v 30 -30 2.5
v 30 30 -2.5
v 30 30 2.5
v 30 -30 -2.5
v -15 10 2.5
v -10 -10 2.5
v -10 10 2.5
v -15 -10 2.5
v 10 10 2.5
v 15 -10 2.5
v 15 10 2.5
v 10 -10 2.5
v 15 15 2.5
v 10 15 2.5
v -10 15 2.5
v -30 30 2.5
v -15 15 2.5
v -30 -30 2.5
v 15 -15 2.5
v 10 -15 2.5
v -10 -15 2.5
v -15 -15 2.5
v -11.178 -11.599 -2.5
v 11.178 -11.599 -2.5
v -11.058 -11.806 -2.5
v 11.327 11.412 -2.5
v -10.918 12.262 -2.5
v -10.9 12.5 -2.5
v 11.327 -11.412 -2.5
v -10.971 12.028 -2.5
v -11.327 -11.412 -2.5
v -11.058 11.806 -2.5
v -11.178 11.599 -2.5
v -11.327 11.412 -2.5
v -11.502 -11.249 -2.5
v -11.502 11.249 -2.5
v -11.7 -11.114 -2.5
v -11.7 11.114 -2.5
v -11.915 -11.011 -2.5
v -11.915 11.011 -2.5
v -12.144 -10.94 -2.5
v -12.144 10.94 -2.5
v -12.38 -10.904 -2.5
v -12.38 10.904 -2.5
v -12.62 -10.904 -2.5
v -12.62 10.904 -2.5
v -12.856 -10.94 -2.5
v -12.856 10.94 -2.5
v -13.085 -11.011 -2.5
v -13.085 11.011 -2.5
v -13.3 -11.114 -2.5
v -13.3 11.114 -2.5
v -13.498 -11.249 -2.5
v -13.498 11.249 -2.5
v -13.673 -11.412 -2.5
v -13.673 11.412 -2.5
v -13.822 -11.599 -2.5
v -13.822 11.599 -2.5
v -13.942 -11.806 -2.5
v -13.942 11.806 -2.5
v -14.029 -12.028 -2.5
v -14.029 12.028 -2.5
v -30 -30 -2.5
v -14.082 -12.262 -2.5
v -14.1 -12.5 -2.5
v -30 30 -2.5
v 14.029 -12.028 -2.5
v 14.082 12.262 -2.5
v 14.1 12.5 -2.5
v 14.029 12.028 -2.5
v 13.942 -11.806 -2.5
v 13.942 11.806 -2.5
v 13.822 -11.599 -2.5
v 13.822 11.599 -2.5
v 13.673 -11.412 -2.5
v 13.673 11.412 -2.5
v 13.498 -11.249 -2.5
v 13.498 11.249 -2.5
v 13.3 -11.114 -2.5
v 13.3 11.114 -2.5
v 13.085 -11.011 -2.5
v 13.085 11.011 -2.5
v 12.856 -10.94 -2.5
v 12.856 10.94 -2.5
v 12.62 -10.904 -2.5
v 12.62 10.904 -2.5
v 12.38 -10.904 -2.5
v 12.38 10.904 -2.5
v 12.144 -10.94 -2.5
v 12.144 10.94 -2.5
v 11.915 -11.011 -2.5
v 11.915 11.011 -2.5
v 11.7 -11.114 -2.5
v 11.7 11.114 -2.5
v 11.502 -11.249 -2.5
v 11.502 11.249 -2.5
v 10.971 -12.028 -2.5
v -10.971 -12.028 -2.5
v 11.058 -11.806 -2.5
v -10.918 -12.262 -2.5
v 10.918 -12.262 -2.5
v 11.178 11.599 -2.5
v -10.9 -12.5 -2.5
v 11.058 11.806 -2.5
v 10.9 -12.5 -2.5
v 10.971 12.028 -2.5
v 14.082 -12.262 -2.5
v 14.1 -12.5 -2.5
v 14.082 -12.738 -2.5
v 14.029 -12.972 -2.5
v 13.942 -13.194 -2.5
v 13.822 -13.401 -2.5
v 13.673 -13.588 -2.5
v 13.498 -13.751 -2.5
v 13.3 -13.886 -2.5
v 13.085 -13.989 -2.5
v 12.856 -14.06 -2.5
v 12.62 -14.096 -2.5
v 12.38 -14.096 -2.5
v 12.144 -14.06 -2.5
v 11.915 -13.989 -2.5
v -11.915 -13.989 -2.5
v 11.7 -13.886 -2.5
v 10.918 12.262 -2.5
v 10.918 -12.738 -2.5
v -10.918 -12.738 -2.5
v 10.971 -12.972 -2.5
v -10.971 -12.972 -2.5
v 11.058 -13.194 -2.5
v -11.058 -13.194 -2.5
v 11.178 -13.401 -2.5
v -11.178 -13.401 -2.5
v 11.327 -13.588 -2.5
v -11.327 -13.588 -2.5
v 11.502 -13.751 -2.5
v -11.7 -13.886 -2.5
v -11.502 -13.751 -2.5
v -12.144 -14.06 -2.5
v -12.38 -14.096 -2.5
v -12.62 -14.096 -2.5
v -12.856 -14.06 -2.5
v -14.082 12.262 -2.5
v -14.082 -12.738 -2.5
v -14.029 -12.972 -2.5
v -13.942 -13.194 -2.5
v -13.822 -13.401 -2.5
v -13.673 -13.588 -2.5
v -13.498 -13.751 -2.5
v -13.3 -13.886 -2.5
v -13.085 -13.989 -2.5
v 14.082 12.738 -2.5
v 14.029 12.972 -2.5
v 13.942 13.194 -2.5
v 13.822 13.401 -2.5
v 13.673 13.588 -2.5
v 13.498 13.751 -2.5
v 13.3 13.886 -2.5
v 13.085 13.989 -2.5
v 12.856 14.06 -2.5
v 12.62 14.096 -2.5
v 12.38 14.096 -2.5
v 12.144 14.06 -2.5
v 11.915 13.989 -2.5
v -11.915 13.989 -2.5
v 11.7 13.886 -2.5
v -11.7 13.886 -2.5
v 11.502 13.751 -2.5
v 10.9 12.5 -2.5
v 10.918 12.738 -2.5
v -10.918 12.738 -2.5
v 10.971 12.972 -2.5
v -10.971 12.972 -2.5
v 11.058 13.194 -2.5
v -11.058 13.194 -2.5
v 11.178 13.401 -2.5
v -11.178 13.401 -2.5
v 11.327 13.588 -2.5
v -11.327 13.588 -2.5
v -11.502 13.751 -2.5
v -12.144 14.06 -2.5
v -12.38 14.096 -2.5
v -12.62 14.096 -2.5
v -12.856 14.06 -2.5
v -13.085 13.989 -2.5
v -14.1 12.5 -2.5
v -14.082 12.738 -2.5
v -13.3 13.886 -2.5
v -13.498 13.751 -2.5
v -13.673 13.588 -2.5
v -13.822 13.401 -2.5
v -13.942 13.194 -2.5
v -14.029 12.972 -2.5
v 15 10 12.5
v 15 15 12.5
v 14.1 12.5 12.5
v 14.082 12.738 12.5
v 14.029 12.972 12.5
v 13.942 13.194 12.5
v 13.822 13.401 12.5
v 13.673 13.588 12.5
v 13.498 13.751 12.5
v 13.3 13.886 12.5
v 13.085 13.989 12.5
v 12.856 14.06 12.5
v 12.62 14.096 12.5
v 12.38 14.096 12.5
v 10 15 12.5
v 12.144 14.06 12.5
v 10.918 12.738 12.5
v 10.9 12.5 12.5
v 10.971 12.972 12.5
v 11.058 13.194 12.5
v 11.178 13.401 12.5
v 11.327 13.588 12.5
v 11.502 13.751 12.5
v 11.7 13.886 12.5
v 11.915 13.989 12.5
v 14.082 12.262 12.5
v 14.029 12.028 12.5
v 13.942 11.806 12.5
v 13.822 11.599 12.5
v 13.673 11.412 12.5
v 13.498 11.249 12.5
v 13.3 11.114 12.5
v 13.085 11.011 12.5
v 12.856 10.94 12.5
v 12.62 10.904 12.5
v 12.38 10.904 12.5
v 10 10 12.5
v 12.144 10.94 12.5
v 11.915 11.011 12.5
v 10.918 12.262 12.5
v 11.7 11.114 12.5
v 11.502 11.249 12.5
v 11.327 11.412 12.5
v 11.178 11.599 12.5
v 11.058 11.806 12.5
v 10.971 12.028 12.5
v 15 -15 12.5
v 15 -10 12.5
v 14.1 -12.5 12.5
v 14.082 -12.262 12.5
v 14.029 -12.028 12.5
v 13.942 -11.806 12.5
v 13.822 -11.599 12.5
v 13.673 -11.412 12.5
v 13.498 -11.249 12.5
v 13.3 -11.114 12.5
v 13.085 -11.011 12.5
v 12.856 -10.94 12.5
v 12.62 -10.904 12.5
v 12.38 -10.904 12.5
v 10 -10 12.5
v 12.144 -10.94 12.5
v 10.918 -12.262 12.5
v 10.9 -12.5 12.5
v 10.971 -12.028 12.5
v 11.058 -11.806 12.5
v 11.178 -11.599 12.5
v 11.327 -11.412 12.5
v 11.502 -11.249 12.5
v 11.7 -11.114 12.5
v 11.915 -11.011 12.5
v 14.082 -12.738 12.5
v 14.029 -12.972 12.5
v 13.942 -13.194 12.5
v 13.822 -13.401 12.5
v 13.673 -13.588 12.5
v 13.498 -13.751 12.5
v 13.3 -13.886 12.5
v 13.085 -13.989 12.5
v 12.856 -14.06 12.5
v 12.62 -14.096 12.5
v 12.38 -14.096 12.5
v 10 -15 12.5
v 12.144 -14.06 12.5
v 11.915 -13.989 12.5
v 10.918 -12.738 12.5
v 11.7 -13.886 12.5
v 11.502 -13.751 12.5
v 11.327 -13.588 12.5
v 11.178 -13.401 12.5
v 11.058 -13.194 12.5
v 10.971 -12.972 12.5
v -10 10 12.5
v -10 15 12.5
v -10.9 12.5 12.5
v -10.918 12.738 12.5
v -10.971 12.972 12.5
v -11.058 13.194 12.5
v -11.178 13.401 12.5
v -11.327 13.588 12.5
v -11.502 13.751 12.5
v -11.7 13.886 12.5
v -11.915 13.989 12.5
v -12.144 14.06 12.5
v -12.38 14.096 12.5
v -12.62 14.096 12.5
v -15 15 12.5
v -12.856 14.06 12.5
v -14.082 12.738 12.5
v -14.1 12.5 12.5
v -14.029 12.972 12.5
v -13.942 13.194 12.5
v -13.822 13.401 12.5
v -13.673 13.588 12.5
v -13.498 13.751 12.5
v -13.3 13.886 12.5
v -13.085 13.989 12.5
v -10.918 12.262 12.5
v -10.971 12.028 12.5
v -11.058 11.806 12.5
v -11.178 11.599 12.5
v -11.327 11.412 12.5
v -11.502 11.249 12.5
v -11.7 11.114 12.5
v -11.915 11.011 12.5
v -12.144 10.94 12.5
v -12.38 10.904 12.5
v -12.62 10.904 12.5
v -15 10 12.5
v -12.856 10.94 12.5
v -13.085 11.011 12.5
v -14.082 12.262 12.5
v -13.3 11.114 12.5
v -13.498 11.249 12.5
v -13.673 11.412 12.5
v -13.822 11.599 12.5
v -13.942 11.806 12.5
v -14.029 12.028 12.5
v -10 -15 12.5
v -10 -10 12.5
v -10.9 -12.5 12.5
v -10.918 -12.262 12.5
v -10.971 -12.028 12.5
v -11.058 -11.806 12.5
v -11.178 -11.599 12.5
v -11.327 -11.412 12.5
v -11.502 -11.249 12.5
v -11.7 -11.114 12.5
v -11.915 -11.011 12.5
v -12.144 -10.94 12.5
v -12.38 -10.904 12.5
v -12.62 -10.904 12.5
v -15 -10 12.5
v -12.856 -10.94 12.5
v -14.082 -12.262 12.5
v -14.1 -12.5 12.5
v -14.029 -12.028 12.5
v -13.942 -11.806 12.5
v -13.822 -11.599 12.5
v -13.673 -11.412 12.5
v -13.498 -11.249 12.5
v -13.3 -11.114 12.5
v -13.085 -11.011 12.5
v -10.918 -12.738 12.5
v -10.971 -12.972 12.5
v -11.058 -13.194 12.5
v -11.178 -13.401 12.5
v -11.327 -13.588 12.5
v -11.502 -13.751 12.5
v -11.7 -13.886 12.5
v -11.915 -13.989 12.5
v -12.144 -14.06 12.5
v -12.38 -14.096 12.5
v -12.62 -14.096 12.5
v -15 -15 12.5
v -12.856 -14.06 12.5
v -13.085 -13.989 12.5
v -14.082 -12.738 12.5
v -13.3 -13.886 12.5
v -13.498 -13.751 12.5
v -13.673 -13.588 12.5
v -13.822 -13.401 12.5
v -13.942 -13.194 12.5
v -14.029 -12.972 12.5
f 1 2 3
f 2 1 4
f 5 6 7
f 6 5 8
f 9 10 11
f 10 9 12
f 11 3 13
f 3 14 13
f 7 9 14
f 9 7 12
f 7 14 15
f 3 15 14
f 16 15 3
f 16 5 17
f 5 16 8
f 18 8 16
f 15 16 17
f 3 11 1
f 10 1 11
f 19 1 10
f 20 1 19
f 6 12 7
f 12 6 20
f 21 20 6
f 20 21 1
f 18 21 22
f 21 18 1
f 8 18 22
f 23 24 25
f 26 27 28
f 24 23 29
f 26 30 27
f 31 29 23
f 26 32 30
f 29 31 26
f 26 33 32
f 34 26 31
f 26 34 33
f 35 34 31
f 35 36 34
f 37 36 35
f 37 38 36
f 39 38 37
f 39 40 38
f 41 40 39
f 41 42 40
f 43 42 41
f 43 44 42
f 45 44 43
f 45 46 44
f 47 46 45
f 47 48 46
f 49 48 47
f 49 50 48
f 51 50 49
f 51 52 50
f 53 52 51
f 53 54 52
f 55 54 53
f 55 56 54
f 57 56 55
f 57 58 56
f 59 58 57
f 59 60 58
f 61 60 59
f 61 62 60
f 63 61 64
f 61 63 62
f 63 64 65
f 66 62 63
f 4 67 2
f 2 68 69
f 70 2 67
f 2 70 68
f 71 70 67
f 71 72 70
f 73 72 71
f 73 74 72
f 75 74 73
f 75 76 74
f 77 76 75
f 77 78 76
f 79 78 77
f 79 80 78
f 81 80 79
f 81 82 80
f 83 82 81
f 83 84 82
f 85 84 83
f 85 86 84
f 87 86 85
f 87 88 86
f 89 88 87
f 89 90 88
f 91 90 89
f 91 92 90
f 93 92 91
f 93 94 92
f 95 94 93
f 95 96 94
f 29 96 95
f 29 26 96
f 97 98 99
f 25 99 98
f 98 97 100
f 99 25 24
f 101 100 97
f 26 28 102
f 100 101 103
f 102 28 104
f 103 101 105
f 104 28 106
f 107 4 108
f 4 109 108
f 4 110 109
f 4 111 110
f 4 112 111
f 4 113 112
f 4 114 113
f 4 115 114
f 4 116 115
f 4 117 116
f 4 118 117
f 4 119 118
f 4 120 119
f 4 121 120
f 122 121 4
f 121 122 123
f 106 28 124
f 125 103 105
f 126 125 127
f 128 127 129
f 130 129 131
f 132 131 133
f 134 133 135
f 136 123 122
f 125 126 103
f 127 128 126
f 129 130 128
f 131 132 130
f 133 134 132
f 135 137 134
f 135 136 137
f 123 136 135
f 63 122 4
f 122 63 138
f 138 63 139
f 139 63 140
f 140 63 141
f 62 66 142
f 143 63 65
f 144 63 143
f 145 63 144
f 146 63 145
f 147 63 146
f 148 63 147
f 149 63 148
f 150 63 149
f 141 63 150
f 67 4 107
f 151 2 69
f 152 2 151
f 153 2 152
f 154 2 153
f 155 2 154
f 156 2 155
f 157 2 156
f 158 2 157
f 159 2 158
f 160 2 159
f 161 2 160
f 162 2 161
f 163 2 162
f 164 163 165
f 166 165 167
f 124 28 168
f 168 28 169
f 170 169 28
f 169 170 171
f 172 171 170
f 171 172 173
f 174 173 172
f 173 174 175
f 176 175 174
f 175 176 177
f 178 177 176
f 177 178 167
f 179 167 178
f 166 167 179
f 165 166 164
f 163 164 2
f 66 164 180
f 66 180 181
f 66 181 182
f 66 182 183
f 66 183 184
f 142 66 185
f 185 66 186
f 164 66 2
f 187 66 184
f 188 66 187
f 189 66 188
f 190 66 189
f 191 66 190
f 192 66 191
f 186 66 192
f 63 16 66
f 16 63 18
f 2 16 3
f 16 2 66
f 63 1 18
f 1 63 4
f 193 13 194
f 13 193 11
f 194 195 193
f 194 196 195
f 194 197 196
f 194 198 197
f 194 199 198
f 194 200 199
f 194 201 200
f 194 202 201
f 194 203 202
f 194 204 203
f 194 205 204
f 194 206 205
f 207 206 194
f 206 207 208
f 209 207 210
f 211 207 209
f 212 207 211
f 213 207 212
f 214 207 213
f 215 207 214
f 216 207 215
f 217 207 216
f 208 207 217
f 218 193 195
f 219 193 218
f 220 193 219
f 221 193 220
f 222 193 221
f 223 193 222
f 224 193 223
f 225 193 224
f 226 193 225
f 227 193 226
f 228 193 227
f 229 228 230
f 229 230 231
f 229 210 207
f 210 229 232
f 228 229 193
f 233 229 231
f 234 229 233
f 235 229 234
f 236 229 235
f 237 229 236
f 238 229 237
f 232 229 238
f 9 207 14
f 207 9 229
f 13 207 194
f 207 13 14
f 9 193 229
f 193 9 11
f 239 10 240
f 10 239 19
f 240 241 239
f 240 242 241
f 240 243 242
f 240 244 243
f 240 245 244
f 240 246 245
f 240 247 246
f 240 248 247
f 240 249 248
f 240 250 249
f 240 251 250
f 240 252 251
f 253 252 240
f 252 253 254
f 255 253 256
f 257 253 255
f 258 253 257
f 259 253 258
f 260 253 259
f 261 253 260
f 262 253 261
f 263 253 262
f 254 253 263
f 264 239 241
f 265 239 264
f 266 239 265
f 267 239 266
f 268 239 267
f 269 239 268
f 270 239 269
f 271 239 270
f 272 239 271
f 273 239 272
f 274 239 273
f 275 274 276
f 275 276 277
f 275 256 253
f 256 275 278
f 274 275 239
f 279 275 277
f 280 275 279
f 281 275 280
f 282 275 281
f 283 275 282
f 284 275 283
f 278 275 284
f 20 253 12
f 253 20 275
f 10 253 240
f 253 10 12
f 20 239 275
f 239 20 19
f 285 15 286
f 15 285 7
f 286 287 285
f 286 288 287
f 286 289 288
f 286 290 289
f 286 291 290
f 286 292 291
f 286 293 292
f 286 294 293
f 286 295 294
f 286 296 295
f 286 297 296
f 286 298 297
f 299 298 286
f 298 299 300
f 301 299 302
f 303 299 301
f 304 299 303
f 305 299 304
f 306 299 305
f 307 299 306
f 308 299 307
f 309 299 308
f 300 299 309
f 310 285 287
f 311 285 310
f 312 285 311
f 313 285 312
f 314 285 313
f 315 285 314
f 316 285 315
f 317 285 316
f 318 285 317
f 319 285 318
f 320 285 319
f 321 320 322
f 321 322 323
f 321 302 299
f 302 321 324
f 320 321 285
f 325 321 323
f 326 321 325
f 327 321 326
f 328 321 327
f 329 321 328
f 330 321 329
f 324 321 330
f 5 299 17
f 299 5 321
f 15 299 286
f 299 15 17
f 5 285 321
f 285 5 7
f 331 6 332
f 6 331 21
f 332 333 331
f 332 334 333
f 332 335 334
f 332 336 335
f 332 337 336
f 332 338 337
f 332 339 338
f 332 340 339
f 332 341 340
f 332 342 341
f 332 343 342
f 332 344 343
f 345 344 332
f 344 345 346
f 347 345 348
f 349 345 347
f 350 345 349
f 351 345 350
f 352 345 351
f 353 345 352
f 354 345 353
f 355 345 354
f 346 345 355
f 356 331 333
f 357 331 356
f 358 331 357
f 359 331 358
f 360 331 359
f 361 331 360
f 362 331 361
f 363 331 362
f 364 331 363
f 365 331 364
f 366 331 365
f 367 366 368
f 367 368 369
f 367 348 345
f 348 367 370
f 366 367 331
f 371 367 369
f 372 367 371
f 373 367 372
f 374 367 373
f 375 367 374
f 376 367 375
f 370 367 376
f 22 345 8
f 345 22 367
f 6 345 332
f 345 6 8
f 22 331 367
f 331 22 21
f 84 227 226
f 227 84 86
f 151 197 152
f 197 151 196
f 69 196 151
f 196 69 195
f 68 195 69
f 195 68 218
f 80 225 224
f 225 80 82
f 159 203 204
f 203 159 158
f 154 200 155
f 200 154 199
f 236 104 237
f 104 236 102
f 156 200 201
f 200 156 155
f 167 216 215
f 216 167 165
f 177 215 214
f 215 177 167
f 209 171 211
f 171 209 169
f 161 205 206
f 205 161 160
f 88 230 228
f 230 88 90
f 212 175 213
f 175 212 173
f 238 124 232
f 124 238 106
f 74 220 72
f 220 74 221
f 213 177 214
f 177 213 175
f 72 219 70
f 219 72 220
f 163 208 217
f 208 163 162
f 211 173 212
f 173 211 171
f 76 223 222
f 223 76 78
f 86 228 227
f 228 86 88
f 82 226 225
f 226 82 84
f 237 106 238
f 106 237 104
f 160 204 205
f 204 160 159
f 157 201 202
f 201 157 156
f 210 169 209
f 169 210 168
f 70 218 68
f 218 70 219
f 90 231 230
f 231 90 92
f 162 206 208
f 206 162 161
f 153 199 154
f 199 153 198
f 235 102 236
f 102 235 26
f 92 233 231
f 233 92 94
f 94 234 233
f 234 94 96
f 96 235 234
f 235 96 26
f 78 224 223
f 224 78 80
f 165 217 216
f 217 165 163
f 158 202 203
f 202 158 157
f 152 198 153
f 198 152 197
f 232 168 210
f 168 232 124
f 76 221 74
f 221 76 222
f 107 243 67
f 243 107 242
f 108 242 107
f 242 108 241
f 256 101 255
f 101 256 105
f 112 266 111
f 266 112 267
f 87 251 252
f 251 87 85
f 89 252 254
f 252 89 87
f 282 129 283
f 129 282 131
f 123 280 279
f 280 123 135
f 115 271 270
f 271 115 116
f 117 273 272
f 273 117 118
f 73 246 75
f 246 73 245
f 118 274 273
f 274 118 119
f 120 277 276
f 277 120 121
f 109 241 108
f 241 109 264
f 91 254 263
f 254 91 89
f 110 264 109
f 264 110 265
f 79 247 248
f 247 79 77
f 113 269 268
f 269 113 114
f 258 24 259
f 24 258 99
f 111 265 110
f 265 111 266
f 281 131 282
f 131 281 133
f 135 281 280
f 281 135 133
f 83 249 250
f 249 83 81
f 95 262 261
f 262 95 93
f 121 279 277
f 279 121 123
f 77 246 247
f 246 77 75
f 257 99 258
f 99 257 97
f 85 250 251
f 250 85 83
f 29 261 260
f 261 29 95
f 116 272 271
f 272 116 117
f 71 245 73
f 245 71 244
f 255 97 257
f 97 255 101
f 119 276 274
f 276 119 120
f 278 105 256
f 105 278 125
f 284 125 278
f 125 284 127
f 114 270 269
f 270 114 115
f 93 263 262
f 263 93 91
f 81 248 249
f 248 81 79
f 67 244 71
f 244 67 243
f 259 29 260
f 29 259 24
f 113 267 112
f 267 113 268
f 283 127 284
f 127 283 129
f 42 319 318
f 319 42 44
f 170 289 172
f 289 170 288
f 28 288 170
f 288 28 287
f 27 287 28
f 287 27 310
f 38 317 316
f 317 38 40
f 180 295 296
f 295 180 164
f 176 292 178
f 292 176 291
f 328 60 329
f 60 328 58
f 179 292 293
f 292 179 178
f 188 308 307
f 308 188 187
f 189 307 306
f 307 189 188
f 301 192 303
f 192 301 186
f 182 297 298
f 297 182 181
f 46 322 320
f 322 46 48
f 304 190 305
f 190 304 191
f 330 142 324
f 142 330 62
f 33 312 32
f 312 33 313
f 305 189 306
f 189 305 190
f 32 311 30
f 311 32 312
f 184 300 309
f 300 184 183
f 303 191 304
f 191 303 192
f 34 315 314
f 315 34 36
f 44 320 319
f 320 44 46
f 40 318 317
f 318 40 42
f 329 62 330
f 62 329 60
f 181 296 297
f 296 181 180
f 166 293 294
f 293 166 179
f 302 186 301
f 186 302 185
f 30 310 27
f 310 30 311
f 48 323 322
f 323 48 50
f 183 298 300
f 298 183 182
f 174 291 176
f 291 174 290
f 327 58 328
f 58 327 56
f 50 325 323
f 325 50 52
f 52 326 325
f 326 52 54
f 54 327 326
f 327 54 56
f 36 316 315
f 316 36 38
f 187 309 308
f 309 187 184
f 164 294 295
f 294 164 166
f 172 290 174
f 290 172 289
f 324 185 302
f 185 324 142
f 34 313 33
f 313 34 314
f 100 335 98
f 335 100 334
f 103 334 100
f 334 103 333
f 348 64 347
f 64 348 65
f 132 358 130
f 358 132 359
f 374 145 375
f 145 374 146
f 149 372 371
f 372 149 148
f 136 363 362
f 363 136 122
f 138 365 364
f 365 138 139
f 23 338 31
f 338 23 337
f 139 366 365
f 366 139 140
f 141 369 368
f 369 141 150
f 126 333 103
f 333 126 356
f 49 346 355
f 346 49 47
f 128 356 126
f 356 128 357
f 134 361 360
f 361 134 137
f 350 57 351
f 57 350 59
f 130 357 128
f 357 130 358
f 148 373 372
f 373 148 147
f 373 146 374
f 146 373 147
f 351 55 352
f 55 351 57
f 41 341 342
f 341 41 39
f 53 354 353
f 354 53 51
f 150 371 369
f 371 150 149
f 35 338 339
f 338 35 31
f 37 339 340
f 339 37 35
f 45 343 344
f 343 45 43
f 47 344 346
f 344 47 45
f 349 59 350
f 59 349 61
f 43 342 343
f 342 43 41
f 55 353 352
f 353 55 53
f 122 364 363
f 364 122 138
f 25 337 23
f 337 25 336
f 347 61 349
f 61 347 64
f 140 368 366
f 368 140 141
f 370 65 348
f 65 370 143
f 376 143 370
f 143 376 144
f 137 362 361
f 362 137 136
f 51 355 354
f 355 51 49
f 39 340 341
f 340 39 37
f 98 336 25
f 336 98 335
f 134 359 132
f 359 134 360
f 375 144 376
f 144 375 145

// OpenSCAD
$fn=42;
hole_spacing=25;
standoff_height=15;
main_dimension=5;
base_width=60;
hole_diameter=3.2;


difference(){
    union(){
        cube([ base_width, base_width, main_dimension], true);
        translate([hole_spacing/2, hole_spacing/2, main_dimension])
            cube([main_dimension, main_dimension, standoff_height], center=true);
        translate([hole_spacing/2, -hole_spacing/2, main_dimension])
            cube([main_dimension, main_dimension, standoff_height], center=true);
        translate([-hole_spacing/2, hole_spacing/2, main_dimension])
            cube([main_dimension, main_dimension, standoff_height], center=true);
        translate([-hole_spacing/2, -hole_spacing/2, main_dimension])
            cube([main_dimension, main_dimension, standoff_height], center=true);
    }
    
    translate([hole_spacing/2, hole_spacing/2, main_dimension/2])
        cylinder(42,hole_diameter/2, hole_diameter/2, center = true);
    translate([hole_spacing/2, -hole_spacing/2, main_dimension/2])
        cylinder(42,hole_diameter/2, hole_diameter/2, center = true);
    translate([-hole_spacing/2, hole_spacing/2, main_dimension/2])
        cylinder(42,hole_diameter/2, hole_diameter/2, center = true);
    translate([-hole_spacing/2, -hole_spacing/2, main_dimension/2])
        cylinder(42,hole_diameter/2, hole_diameter/2, center = true);
}
